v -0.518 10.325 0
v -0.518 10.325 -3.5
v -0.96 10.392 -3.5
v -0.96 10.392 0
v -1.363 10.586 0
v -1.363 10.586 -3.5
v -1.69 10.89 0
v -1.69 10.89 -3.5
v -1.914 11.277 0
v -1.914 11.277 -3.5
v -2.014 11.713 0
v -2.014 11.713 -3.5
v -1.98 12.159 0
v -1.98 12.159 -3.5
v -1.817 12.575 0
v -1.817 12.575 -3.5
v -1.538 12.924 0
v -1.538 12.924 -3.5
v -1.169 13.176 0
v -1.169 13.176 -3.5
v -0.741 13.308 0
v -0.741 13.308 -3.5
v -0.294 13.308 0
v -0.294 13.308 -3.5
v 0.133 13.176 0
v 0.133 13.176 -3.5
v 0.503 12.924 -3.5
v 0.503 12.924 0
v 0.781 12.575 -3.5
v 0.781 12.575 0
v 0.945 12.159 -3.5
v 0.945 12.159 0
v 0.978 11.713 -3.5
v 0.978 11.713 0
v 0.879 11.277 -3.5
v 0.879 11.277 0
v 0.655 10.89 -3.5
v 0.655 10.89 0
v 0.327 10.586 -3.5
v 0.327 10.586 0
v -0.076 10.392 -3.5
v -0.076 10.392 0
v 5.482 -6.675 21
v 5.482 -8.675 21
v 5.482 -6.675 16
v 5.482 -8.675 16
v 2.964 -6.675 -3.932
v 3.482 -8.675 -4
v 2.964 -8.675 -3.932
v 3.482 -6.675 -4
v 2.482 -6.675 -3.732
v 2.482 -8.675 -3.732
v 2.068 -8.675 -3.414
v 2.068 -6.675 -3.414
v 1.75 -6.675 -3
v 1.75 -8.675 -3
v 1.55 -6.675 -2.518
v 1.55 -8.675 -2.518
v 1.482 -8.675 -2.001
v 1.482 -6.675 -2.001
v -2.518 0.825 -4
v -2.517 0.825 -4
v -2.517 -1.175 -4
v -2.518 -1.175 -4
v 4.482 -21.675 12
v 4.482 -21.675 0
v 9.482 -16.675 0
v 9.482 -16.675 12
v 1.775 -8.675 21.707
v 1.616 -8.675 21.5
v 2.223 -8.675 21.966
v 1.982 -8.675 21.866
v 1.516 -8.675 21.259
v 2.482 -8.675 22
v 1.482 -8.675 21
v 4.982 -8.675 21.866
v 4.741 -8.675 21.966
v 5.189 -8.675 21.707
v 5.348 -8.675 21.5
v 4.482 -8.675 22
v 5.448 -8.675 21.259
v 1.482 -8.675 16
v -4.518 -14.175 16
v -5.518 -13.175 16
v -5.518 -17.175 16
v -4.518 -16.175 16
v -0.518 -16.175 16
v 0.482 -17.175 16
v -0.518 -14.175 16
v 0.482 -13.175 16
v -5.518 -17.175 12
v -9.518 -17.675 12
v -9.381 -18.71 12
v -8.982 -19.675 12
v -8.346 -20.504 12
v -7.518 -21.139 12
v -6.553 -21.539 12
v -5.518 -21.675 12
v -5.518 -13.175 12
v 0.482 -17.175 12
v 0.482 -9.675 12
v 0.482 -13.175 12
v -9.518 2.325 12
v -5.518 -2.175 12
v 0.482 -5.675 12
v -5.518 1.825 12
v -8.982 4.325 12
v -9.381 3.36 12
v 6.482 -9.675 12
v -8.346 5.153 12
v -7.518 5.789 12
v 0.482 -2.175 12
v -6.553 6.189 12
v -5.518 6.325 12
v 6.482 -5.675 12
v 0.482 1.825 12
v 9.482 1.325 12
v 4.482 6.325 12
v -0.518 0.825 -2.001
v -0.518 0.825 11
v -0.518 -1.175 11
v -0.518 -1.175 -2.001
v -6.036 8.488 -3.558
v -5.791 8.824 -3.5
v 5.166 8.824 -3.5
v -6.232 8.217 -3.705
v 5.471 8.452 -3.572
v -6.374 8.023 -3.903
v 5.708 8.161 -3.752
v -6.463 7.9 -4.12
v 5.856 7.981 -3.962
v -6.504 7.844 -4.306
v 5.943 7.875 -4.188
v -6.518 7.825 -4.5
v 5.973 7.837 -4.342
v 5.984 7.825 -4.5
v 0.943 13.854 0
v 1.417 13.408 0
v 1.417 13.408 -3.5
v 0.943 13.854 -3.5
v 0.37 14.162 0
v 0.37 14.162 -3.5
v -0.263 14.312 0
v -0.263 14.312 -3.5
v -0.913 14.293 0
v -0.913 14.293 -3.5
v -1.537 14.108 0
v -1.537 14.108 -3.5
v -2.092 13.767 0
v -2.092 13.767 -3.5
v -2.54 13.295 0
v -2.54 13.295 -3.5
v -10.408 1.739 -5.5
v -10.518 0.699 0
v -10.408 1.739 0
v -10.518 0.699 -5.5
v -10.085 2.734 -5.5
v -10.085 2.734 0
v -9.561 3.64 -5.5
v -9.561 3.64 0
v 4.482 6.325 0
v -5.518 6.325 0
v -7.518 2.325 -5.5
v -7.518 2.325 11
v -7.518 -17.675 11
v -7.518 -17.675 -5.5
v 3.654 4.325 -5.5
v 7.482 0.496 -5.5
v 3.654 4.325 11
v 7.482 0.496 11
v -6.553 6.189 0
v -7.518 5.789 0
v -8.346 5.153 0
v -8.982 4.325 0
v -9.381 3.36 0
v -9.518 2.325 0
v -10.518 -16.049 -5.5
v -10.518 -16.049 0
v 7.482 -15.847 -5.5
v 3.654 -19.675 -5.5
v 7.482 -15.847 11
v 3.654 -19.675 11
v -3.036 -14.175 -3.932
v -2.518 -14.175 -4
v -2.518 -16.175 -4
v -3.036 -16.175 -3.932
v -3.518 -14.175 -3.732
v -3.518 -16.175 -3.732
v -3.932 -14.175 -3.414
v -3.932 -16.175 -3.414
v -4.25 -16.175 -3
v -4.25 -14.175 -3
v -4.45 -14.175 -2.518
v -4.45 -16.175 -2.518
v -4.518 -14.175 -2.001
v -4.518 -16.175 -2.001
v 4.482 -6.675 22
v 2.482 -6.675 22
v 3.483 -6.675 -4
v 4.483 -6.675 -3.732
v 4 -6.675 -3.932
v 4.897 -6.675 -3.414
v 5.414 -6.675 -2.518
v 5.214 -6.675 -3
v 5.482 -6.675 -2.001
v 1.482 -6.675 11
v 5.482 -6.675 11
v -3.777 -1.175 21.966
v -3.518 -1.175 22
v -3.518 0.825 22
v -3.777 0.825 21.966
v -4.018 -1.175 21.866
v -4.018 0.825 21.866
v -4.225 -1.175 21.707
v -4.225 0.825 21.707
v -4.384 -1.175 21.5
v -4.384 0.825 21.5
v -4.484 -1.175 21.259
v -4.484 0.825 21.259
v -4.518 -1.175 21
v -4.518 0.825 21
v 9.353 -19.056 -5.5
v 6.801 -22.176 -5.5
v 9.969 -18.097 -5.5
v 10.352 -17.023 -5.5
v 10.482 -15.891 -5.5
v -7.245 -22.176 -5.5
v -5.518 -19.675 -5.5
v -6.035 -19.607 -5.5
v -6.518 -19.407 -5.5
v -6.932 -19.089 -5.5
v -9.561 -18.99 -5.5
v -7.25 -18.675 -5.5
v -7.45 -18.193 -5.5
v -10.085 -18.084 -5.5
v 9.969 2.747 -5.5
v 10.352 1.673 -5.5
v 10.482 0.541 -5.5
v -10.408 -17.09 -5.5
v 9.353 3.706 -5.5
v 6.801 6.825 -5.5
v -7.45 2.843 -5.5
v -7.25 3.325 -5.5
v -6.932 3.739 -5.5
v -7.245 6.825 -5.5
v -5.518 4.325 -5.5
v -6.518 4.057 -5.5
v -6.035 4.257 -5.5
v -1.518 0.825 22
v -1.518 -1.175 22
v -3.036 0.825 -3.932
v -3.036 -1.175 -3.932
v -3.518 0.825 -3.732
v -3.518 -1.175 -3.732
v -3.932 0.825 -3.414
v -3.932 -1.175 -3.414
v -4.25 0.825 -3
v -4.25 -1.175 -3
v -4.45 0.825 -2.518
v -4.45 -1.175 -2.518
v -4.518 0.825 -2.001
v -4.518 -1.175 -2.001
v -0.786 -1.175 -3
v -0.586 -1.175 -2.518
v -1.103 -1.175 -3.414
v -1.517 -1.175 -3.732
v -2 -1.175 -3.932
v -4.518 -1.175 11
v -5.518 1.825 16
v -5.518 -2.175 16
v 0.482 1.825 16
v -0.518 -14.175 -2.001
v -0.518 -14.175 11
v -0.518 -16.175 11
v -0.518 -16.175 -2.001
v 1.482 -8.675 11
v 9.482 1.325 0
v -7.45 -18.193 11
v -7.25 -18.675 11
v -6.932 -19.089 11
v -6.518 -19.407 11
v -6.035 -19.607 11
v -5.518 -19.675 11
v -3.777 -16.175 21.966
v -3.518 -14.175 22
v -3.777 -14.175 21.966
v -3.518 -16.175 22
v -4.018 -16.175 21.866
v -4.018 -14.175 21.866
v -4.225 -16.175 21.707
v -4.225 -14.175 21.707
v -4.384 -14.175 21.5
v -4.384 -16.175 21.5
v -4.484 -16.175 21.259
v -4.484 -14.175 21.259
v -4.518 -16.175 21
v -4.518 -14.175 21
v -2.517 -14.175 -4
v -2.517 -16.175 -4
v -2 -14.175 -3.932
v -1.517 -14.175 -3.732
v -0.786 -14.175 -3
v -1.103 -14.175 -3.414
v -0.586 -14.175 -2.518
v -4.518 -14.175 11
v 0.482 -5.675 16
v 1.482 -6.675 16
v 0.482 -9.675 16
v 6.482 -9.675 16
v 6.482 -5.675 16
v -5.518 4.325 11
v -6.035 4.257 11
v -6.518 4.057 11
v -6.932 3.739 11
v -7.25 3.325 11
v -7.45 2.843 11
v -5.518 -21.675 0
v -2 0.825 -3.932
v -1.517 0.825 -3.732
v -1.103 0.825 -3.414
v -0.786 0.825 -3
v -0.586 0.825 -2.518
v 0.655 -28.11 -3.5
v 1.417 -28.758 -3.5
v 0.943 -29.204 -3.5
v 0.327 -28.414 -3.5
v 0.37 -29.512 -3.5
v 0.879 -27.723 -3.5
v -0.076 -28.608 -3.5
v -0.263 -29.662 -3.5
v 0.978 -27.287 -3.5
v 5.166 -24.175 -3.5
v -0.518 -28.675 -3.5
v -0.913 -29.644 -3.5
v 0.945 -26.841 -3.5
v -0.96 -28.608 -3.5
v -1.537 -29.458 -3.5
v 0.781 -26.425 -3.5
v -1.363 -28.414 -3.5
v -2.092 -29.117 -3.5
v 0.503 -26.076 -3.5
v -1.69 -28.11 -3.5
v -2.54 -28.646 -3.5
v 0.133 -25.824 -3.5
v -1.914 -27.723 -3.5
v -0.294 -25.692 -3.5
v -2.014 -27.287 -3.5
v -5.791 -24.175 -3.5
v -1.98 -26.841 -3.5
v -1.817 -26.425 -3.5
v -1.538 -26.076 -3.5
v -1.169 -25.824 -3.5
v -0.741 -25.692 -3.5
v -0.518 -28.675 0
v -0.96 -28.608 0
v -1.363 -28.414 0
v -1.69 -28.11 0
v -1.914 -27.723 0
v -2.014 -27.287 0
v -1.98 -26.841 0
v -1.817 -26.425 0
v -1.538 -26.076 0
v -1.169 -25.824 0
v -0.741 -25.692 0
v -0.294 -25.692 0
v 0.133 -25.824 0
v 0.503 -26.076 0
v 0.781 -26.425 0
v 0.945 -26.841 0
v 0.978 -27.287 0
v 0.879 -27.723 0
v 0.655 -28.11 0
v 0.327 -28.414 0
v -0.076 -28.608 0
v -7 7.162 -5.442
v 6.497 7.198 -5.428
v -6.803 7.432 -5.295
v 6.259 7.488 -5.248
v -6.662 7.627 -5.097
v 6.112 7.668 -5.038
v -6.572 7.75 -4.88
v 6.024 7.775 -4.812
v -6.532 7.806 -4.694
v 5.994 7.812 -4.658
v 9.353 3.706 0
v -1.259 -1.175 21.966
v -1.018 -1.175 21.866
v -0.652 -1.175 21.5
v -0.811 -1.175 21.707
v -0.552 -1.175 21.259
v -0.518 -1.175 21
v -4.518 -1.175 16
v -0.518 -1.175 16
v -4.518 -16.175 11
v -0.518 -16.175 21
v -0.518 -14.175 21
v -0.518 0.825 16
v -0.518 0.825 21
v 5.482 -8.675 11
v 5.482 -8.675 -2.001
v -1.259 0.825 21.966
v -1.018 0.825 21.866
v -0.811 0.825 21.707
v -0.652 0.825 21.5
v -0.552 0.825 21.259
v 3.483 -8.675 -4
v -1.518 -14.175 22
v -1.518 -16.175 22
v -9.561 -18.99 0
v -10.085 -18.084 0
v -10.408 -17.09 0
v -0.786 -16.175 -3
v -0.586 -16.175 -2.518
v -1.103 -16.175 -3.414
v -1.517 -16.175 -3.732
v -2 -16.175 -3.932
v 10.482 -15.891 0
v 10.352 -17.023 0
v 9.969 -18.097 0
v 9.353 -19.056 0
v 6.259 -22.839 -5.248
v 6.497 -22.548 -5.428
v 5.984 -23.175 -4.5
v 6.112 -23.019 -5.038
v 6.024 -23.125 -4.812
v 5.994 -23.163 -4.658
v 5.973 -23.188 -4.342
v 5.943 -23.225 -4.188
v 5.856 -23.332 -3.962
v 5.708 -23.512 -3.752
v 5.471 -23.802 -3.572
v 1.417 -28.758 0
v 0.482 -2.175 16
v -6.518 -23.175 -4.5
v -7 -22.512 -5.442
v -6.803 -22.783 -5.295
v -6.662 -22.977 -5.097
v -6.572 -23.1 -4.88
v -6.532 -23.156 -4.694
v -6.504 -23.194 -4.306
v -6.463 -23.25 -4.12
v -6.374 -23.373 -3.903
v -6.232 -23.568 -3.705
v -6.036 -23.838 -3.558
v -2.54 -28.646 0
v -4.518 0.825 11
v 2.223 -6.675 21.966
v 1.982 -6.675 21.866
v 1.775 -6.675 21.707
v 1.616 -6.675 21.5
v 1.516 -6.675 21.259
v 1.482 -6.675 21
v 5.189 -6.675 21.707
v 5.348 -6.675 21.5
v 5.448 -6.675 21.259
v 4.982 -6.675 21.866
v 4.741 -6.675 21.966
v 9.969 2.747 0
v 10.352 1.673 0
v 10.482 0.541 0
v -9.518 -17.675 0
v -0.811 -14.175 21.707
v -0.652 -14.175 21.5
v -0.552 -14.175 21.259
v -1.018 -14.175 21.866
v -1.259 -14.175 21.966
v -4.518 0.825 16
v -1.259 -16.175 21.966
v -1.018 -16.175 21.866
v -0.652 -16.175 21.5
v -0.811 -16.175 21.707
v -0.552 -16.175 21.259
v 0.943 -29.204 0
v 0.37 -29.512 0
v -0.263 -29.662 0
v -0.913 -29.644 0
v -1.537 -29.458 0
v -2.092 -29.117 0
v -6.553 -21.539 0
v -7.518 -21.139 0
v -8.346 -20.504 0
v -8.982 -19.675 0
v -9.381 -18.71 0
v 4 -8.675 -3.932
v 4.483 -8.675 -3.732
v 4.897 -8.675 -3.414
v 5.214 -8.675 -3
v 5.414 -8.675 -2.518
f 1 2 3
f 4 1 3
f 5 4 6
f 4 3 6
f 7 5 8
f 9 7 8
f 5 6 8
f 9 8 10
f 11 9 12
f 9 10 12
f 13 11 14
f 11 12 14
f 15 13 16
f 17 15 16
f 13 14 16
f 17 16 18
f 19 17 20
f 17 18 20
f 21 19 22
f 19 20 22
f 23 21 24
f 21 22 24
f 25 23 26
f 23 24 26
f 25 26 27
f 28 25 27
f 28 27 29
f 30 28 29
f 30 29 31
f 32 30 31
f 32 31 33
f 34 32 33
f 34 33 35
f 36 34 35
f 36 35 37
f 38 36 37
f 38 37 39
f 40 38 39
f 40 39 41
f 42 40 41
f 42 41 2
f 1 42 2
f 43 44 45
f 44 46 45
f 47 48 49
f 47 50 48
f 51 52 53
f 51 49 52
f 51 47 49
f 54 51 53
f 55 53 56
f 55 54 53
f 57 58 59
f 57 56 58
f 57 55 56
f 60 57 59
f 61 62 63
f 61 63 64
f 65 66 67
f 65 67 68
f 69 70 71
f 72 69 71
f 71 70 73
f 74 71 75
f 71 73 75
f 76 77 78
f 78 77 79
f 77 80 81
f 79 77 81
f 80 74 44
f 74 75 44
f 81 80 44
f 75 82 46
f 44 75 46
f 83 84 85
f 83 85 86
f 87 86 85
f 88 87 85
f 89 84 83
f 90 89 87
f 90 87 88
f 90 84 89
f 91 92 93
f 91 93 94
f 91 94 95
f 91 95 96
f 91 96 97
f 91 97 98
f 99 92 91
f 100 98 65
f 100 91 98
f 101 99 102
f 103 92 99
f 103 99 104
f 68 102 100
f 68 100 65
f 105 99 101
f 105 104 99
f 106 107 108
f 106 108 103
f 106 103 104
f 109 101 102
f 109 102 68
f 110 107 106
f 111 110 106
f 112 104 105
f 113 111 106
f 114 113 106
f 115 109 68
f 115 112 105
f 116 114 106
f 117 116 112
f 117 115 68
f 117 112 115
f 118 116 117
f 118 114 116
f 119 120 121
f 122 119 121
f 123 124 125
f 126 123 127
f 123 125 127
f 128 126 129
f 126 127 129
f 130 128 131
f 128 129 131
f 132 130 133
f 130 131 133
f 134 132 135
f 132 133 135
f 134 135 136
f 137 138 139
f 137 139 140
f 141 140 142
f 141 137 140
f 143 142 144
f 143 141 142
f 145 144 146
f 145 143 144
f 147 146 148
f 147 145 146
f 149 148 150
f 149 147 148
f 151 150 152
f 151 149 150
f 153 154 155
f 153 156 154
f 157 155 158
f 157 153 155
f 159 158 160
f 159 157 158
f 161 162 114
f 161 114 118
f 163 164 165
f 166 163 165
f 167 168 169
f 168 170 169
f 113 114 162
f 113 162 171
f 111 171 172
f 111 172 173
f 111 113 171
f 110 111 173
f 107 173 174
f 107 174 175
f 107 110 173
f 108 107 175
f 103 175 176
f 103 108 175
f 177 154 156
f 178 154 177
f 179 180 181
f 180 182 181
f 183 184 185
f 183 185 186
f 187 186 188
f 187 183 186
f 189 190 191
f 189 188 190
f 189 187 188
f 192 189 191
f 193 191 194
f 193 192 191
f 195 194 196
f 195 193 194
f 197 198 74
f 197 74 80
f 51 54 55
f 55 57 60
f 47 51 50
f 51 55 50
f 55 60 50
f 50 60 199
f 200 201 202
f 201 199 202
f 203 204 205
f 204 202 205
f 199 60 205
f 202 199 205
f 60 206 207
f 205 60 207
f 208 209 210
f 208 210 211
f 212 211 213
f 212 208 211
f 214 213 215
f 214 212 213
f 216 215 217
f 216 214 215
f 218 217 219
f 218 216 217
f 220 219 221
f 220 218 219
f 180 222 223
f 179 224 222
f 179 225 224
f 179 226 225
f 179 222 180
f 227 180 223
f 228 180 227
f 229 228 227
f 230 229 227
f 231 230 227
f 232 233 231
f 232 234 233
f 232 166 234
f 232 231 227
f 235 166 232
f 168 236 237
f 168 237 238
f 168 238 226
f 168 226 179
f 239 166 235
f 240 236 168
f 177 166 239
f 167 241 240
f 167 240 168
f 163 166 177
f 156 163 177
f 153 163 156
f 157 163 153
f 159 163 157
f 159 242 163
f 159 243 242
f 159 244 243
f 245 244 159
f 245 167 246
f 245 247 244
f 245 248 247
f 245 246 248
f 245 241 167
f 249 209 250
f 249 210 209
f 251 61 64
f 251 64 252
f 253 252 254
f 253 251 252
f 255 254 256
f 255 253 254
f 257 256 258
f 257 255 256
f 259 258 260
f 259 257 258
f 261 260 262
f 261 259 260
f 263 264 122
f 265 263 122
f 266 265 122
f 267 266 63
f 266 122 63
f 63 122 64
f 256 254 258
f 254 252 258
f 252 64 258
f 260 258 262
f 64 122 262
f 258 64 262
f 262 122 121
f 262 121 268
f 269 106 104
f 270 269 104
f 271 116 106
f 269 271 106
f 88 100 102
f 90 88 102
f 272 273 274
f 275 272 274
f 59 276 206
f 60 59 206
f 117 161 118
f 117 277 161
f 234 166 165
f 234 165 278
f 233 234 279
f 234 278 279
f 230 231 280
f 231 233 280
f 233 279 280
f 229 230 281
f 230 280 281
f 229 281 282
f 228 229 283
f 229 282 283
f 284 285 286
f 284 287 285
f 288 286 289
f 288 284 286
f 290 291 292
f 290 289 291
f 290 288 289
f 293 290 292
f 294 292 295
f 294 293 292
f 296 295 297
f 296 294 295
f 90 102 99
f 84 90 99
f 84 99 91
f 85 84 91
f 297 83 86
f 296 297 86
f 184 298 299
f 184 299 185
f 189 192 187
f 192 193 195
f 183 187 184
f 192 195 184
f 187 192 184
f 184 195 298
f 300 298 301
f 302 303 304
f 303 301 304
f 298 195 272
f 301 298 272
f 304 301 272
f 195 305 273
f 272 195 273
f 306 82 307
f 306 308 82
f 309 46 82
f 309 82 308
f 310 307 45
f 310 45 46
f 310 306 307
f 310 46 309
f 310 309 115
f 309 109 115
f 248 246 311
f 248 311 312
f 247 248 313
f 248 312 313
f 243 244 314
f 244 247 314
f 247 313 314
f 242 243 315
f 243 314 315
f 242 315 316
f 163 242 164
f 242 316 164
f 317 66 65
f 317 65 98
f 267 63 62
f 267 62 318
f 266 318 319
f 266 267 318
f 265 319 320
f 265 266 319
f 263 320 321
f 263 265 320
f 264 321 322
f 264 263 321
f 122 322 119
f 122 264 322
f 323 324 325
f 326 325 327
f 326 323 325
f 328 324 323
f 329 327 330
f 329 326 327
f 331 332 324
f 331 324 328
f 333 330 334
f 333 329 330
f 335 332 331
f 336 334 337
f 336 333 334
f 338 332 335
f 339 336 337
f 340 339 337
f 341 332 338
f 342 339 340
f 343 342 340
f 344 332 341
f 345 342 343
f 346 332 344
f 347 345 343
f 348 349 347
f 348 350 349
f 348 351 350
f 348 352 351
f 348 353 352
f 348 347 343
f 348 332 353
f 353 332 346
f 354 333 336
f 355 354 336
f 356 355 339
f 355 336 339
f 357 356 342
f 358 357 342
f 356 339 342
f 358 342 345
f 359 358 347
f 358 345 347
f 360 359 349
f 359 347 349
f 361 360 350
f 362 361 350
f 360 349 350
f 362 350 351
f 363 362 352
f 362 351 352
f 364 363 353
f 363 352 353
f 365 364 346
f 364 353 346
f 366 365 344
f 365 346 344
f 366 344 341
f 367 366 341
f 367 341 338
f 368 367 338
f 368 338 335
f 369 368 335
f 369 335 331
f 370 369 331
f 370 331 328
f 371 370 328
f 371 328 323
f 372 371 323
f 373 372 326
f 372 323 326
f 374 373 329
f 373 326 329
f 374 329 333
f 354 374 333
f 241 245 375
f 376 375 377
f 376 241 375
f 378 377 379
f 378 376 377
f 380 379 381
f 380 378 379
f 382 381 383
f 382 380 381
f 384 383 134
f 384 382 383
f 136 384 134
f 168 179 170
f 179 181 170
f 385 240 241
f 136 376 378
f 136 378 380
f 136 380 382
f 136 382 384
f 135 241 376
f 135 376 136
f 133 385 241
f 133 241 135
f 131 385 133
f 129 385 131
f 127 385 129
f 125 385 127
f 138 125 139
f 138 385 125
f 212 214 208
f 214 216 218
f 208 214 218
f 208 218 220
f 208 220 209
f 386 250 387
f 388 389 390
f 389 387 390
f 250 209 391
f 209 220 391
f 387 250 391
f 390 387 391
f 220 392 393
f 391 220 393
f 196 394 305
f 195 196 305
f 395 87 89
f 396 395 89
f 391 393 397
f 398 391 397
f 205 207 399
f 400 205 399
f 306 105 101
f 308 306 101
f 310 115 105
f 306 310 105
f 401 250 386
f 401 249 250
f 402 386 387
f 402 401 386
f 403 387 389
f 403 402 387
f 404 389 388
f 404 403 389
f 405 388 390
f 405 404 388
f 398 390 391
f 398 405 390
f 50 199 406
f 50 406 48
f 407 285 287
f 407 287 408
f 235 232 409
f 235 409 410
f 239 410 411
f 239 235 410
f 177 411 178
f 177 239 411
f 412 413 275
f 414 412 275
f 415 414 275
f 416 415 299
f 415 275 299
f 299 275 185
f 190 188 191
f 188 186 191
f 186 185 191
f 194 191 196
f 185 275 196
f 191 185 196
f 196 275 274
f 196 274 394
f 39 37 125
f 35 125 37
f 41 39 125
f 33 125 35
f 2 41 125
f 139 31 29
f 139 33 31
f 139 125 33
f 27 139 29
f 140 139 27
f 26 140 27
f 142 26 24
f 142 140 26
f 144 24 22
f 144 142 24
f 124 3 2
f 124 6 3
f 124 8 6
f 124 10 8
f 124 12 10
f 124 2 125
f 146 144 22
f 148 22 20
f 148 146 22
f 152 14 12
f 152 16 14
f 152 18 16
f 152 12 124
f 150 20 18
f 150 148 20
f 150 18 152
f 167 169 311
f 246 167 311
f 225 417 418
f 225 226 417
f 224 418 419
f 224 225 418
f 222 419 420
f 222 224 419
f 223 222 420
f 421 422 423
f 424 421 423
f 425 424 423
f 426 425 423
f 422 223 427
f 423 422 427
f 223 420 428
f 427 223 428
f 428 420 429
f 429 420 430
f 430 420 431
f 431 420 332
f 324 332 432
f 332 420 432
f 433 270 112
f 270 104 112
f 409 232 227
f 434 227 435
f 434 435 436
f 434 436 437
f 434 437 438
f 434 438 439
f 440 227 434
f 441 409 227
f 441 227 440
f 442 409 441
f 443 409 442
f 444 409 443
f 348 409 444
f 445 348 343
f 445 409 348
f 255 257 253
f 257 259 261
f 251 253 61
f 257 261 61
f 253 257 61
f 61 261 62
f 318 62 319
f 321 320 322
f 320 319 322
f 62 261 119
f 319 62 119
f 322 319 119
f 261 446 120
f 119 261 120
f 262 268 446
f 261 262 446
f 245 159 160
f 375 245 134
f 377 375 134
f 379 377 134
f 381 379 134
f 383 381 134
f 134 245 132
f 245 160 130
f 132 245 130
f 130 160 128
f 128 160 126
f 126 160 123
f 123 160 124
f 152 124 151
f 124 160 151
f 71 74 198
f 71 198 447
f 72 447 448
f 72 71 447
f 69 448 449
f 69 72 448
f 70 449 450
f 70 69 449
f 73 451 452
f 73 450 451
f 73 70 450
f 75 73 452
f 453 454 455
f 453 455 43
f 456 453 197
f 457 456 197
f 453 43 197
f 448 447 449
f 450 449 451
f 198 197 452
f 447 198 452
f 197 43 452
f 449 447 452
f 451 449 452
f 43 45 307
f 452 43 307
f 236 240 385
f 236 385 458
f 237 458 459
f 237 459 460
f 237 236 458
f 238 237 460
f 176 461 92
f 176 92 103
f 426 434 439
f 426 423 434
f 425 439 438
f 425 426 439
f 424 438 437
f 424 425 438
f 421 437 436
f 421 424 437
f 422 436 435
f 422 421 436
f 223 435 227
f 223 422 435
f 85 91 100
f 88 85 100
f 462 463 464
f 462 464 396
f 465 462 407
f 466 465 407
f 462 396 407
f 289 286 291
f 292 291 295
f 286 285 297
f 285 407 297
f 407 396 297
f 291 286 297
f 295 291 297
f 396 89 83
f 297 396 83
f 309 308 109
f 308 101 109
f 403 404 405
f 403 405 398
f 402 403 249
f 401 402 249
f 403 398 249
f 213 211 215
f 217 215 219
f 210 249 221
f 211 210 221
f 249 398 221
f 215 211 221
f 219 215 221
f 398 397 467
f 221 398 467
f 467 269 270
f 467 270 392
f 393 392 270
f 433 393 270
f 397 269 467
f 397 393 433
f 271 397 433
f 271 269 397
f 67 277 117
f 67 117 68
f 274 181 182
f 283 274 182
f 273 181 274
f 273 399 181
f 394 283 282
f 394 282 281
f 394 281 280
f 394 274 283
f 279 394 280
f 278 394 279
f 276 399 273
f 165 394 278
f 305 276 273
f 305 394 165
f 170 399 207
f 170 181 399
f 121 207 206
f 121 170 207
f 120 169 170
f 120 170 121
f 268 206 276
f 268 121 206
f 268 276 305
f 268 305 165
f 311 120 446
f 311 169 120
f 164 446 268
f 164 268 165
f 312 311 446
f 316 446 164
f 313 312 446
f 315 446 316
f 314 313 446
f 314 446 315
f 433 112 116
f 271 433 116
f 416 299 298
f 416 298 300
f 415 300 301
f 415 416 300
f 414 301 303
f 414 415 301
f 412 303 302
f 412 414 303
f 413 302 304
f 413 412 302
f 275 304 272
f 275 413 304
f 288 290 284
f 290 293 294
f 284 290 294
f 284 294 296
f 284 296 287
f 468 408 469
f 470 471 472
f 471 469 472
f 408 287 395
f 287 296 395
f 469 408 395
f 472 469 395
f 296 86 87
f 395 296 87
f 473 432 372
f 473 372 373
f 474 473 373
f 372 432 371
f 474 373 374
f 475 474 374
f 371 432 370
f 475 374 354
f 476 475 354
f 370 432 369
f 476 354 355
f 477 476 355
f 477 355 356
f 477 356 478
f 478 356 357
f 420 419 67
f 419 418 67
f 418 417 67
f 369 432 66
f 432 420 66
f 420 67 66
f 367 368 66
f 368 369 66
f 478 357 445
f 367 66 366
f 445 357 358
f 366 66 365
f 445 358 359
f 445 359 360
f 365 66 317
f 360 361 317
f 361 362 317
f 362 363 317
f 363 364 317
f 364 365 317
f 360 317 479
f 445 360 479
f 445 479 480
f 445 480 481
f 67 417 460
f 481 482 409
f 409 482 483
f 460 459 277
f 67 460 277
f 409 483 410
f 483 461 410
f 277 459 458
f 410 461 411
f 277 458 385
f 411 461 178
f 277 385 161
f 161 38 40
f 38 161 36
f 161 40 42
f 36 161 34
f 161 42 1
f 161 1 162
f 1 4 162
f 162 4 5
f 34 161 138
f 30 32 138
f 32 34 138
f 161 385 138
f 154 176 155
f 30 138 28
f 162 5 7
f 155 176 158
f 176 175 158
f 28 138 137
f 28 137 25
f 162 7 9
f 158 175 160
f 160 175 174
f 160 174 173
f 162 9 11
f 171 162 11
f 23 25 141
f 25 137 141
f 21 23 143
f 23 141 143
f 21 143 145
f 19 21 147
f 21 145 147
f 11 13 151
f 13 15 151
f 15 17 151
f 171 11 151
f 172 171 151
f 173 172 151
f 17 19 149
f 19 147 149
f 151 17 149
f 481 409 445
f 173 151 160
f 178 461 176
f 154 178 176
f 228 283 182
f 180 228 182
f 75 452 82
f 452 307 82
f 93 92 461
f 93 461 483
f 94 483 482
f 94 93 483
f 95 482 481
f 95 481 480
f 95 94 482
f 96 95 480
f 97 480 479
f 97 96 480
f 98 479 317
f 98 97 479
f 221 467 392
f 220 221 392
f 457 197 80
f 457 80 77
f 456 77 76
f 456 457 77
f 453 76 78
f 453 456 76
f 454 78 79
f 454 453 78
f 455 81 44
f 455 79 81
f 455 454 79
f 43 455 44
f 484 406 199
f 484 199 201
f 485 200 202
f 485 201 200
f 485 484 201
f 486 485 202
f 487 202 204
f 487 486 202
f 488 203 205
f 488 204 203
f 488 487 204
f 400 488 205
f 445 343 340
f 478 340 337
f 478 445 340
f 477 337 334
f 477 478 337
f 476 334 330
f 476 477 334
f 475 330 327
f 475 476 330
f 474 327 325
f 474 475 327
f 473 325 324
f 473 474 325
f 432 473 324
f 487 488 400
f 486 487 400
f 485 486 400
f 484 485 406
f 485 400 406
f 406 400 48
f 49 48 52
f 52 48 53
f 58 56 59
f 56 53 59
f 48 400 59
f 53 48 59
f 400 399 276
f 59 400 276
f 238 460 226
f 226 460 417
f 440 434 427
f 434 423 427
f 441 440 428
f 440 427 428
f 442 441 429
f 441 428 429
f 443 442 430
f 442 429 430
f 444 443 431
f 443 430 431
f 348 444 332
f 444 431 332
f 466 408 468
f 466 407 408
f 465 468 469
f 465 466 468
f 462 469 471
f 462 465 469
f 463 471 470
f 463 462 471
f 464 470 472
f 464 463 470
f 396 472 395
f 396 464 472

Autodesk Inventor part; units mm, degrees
ref_plane "YZ Plane" through (0, 0, 0) normal (1, 0, 0) x (0, 1, 0)
ref_plane "XZ Plane" through (0, 0, 0) normal (0, 1, 0) x (-1, 0, 0)
ref_plane "XY Plane" through (0, 0, 0) normal (0, 0, 1) x (1, 0, 0)
sketch "Szkic1" plane through (0, 0, 0) normal (0, 0, 1) x (1, 0, 0)
  line L0 (-9.5177, 6.3249) -> (9.4823, 6.3249)
  line L1 (9.4823, 6.3249) -> (9.4823, -21.6751)
  line L2 (9.4823, -21.6751) -> (-9.5177, -21.6751)
  line L3 (-9.5177, -21.6751) -> (-9.5177, 6.3249)
  point P0 (0, 0)
  dimension "d0" = 19
  dimension "d1" = 28
extrude "Wyciągnięcie proste1" add sketch "Szkic1" along normal blind 12
chamfer "Faza1" distance 5 angle 45 2 edges at (9.4823, 6.3249, 6) (9.4823, -21.6751, 6)
fillet "Zaokrąglenie1" radius 4 2 edges at (-9.5177, 6.3249, 6) (-9.5177, -21.6751, 6)
sketch "Szkic2" plane through (0, 0, 0) normal (0, 0, -1) x (-1, 0, 0)
  line L0 (-4.4823, -21.6751) -> (5.5177, -21.6751) projected
  line L1 (5.5177, 6.3249) -> (-4.4823, 6.3249) projected
  arc A0 (5.5177, -21.6751) -> (9.5177, -17.6751) centre (5.5177, -17.6751) ccw projected
  line L2 (9.5177, -17.6751) -> (9.5177, 2.3249) projected
  arc A1 (9.5177, 2.3249) -> (5.5177, 6.3249) centre (5.5177, 2.3249) ccw projected
  line L3 (5.5177, 6.3249) -> (-4.4823, 6.3249) projected
  line L4 (-9.4823, 1.3249) -> (-4.4823, 6.3249) projected
  line L5 (-9.4823, 1.3249) -> (-9.4823, -16.6751) projected
  line L6 (-4.4823, -21.6751) -> (-9.4823, -16.6751) projected
  line L7 (-4.4823, -21.6751) -> (5.5177, -21.6751) projected
  line L8 (7.5177, 2.3249) -> (7.5177, -17.6751)
  arc A2 (5.5177, -19.6751) -> (7.5177, -17.6751) centre (5.5177, -17.6751) ccw
  line L9 (5.5177, -19.6751) -> (-3.6539, -19.6751)
  line L10 (-3.6539, -19.6751) -> (-7.4823, -15.8467)
  line L11 (-7.4823, -15.8467) -> (-7.4823, 0.4965)
  line L12 (-7.4823, 0.4965) -> (-3.6539, 4.3249)
  line L13 (-3.6539, 4.3249) -> (5.5177, 4.3249)
  arc A3 (7.5177, 2.3249) -> (5.5177, 4.3249) centre (5.5177, 2.3249) ccw
  line L14 (10.5177, 2.3249) -> (10.5177, -17.6751)
  line L15 (-10.4823, 2.3249) -> (-10.4823, -17.6751)
  circle A4 centre (0.5177, 11.8249) radius 2.5
  circle A5 centre (0.5177, -27.1751) radius 2.5
  line L16 (-10.4823, -17.6751) -> (-1.4174, -28.7579)
  line L17 (10.5177, 2.3249) -> (2.5396, 13.2953)
  line L18 (10.5177, -17.6751) -> (2.5396, -28.6455)
  line L19 (-10.4823, 2.3249) -> (-1.4174, 13.4077)
  point P0 (0, 0)
  dimension "d8" = 28
  dimension "d9" = 2
  dimension "d10" = 20
  dimension "d11" = 1
  dimension "d12" = 4
  dimension "d13" = 20
  dimension "d14" = 1
  dimension "d15" = 4
  dimension "d16" = 10
  dimension "d17" = 10
  dimension "d18" = 39
  dimension "d19" = 5.5
  dimension "d20" = 5
  dimension "d21" = 5
extrude "Wyciągnięcie proste2" add sketch "Szkic2" along normal blind 5.5 contours L6 L5 L4 L1 A1 L2 A0 L0 | L14 L18 A5 L16 L15 L19 A4 L17 | A4 | A5
extrude "Wyciągnięcie proste3" cut sketch "Szkic2" against normal blind 11 contours L8 A2 L9 L10 L11 L12 L13 A3
hole "Otwór1" at (-0.5177, 11.8249, 0) at (-0.5177, -27.1751, 0) direction (0, 0, -1) diameter 3 end through all
sketch "Szkic3" plane through (0, 0, -5.5) normal (0, 0, -1) x (-1, 0, 0)
  circle A0 centre (0.5177, 11.8249) radius 1.5 projected
  circle A1 centre (0.5177, -27.1751) radius 1.5 projected
  arc A2 (5.5177, -19.6751) -> (7.5177, -17.6751) centre (5.5177, -17.6751) ccw projected
  line L0 (5.5177, -19.6751) -> (-3.6539, -19.6751) projected
  line L1 (-3.6539, -19.6751) -> (-7.4823, -15.8467) projected
  line L2 (-7.4823, -15.8467) -> (-7.4823, 0.4965) projected
  line L3 (-7.4823, 0.4965) -> (-3.6539, 4.3249) projected
  line L4 (-3.6539, 4.3249) -> (5.5177, 4.3249) projected
  arc A3 (7.5177, 2.3249) -> (5.5177, 4.3249) centre (5.5177, 2.3249) ccw projected
  line L5 (7.5177, 2.3249) -> (7.5177, -17.6751) projected
  arc A4 (-1.4174, -28.7579) -> (2.5396, -28.6455) centre (0.5177, -27.1751) ccw projected
  line L6 (2.5396, -28.6455) -> (10.5177, -17.6751) projected
  line L7 (10.5177, -17.6751) -> (10.5177, 2.3249) projected
  line L8 (10.5177, 2.3249) -> (2.5396, 13.2953) projected
  arc A5 (2.5396, 13.2953) -> (-1.4174, 13.4077) centre (0.5177, 11.8249) ccw projected
  line L9 (-1.4174, 13.4077) -> (-10.4823, 2.3249) projected
  line L10 (-10.4823, 2.3249) -> (-10.4823, -17.6751) projected
  line L11 (-10.4823, -17.6751) -> (-1.4174, -28.7579) projected
  line L12 (6.5179, 7.8249) -> (-5.9837, 7.8249)
  line L13 (6.5179, -23.1751) -> (-5.9837, -23.1751)
  point P0 (0, 0)
  dimension "d33" = 31
  dimension "d34" = 39
  dimension "d35" = 4
extrude "Wyciągnięcie proste4" cut sketch "Szkic3" against normal blind 2 contours L11 L13 L6 A4 | L9 A5 L8 L12
fillet "Zaokrąglenie2" radius 1 4 edges at (-0.2671, 7.8249, -5.5) (-0.2671, 7.8249, -3.5) (-0.2671, -23.1751, -3.5) (-0.2671, -23.1751, -5.5)
fillet "Zaokrąglenie3" radius 5 4 edges at (-10.5177, 2.3249, -2.75) (-10.5177, -17.6751, -2.75) (10.4823, 2.3249, -2.75) (10.4823, -17.6751, -2.75)
sketch "Szkic4" plane through (0, 0, 11) normal (0, 0, -1) x (-1, 0, 0)
  line L0 (7.5177, 2.3249) -> (7.5177, -17.6751) projected
  arc A0 (7.5177, 2.3249) -> (5.5177, 4.3249) centre (5.5177, 2.3249) ccw projected
  line L1 (-3.6539, 4.3249) -> (5.5177, 4.3249) projected
  line L2 (-7.4823, 0.4965) -> (-3.6539, 4.3249) projected
  line L3 (-7.4823, -15.8467) -> (-7.4823, 0.4965) projected
  line L4 (-3.6539, -19.6751) -> (-7.4823, -15.8467) projected
  line L5 (5.5177, -19.6751) -> (-3.6539, -19.6751) projected
  arc A1 (5.5177, -19.6751) -> (7.5177, -17.6751) centre (5.5177, -17.6751) ccw projected
  line L6 (4.5177, 0.8249) -> (0.5177, 0.8249)
  line L7 (0.5177, 0.8249) -> (0.5177, -1.1751)
  line L8 (0.5177, -1.1751) -> (4.5177, -1.1751)
  line L9 (4.5177, -1.1751) -> (4.5177, 0.8249)
  line L10 (4.5177, -14.1751) -> (0.5177, -14.1751)
  line L11 (0.5177, -14.1751) -> (0.5177, -16.1751)
  line L12 (0.5177, -16.1751) -> (4.5177, -16.1751)
  line L13 (4.5177, -16.1751) -> (4.5177, -14.1751)
  line L14 (-1.4823, -6.6751) -> (-5.4823, -6.6751)
  line L15 (-5.4823, -6.6751) -> (-5.4823, -8.6751)
  line L16 (-5.4823, -8.6751) -> (-1.4823, -8.6751)
  line L17 (-1.4823, -8.6751) -> (-1.4823, -6.6751)
  point P0 (0, 0)
  dimension "d40" = 4
  dimension "d41" = 2
  dimension "d42" = 4
  dimension "d43" = 2
  dimension "d44" = 4
  dimension "d45" = 2
  dimension "d46" = 13
  dimension "d47" = 24
  dimension "d48" = 3.5
  dimension "d49" = 5.5
  dimension "d50" = 2
  dimension "d51" = 3
  dimension "d52" = 3
extrude "Wyciągnięcie proste5" add sketch "Szkic4" along normal blind 15 contours L9 L8 L7 L6 | L13 L12 L11 L10 | L17 L16 L15 L14
fillet "Zaokrąglenie4" radius 2 6 edges at (1.4823, -7.6751, -4) (5.4823, -7.6751, -4) (-0.5177, -0.1751, -4) (-4.5177, -0.1751, -4) (-0.5177, -15.1751, -4) (-4.5177, -15.1751, -4)
sketch "Szkic5" plane through (0, 0, 12) normal (0, 0, 1) x (1, 0, 0)
  arc A0 (-9.5177, -17.6751) -> (-5.5177, -21.6751) centre (-5.5177, -17.6751) ccw projected
  line L0 (-5.5177, -21.6751) -> (4.4823, -21.6751) projected
  line L1 (9.4823, -16.6751) -> (4.4823, -21.6751) projected
  line L2 (9.4823, -16.6751) -> (9.4823, 1.3249) projected
  line L3 (4.4823, 6.3249) -> (9.4823, 1.3249) projected
  line L4 (4.4823, 6.3249) -> (-5.5177, 6.3249) projected
  arc A1 (-5.5177, 6.3249) -> (-9.5177, 2.3249) centre (-5.5177, 2.3249) ccw projected
  line L5 (-9.5177, 2.3249) -> (-9.5177, -17.6751) projected
  line L6 (-0.5177, -14.1751) -> (-4.5177, -14.1751) projected
  line L7 (-4.5177, -16.1751) -> (-0.5177, -16.1751) projected
  line L8 (-4.5177, -14.1751) -> (-4.5177, -16.1751) projected
  line L9 (-0.5177, -16.1751) -> (-0.5177, -14.1751) projected
  line L10 (-4.5177, -1.1751) -> (-0.5177, -1.1751) projected
  line L11 (-0.5177, 0.8249) -> (-4.5177, 0.8249) projected
  line L12 (-4.5177, 0.8249) -> (-4.5177, -1.1751) projected
  line L13 (-0.5177, -1.1751) -> (-0.5177, 0.8249) projected
  line L14 (1.4823, -8.6751) -> (5.4823, -8.6751) projected
  line L15 (5.4823, -6.6751) -> (1.4823, -6.6751) projected
  line L16 (5.4823, -8.6751) -> (5.4823, -6.6751) projected
  line L17 (1.4823, -6.6751) -> (1.4823, -8.6751) projected
  line L18 (-5.5177, -17.1751) -> (0.4823, -17.1751)
  line L19 (0.4823, -17.1751) -> (0.4823, -13.1751)
  line L20 (0.4823, -13.1751) -> (-5.5177, -13.1751)
  line L21 (-5.5177, -13.1751) -> (-5.5177, -17.1751)
  line L22 (0.4823, -9.6751) -> (6.4823, -9.6751)
  line L23 (6.4823, -9.6751) -> (6.4823, -5.6751)
  line L24 (6.4823, -5.6751) -> (0.4823, -5.6751)
  line L25 (0.4823, -5.6751) -> (0.4823, -9.6751)
  line L26 (0.4823, 1.8249) -> (-5.5177, 1.8249)
  line L27 (-5.5177, 1.8249) -> (-5.5177, -2.1751)
  line L28 (-5.5177, -2.1751) -> (0.4823, -2.1751)
  line L29 (0.4823, -2.1751) -> (0.4823, 1.8249)
  point P0 (0, 0)
  dimension "d56" = 1
  dimension "d57" = 1
  dimension "d58" = 1
extrude "Wyciągnięcie proste6" add sketch "Szkic5" along normal blind 10 contours L9 L7 L8 L6 | L12 L11 L13 L10 | L17 L15 L16 L14
extrude "Wyciągnięcie proste7" add sketch "Szkic5" along normal blind 4 contours L21 L20 L19 L18 | L25 L24 L23 L22 | L29 L28 L27 L26
fillet "Zaokrąglenie5" radius 1 6 edges at (-4.5177, -15.1751, 22) (-0.5177, -15.1751, 22) (-4.5177, -0.1751, 22) (-0.5177, -0.1751, 22) (1.4823, -7.6751, 22) (5.4823, -7.6751, 22)
equation "\"d12\" = -0.5 * d10 + 0.5 * d8"
equation "\"d14\" = d11"
equation "\"d15\" = d12"
equation "\"d19\" = -0.5 * d8 + 0.5 * d18"
equation "\"d35\" = -0.5 * d33 + 0.5 * d34"
properties part number "COTS_GENERIC_AC_Power_Socket_C14"
